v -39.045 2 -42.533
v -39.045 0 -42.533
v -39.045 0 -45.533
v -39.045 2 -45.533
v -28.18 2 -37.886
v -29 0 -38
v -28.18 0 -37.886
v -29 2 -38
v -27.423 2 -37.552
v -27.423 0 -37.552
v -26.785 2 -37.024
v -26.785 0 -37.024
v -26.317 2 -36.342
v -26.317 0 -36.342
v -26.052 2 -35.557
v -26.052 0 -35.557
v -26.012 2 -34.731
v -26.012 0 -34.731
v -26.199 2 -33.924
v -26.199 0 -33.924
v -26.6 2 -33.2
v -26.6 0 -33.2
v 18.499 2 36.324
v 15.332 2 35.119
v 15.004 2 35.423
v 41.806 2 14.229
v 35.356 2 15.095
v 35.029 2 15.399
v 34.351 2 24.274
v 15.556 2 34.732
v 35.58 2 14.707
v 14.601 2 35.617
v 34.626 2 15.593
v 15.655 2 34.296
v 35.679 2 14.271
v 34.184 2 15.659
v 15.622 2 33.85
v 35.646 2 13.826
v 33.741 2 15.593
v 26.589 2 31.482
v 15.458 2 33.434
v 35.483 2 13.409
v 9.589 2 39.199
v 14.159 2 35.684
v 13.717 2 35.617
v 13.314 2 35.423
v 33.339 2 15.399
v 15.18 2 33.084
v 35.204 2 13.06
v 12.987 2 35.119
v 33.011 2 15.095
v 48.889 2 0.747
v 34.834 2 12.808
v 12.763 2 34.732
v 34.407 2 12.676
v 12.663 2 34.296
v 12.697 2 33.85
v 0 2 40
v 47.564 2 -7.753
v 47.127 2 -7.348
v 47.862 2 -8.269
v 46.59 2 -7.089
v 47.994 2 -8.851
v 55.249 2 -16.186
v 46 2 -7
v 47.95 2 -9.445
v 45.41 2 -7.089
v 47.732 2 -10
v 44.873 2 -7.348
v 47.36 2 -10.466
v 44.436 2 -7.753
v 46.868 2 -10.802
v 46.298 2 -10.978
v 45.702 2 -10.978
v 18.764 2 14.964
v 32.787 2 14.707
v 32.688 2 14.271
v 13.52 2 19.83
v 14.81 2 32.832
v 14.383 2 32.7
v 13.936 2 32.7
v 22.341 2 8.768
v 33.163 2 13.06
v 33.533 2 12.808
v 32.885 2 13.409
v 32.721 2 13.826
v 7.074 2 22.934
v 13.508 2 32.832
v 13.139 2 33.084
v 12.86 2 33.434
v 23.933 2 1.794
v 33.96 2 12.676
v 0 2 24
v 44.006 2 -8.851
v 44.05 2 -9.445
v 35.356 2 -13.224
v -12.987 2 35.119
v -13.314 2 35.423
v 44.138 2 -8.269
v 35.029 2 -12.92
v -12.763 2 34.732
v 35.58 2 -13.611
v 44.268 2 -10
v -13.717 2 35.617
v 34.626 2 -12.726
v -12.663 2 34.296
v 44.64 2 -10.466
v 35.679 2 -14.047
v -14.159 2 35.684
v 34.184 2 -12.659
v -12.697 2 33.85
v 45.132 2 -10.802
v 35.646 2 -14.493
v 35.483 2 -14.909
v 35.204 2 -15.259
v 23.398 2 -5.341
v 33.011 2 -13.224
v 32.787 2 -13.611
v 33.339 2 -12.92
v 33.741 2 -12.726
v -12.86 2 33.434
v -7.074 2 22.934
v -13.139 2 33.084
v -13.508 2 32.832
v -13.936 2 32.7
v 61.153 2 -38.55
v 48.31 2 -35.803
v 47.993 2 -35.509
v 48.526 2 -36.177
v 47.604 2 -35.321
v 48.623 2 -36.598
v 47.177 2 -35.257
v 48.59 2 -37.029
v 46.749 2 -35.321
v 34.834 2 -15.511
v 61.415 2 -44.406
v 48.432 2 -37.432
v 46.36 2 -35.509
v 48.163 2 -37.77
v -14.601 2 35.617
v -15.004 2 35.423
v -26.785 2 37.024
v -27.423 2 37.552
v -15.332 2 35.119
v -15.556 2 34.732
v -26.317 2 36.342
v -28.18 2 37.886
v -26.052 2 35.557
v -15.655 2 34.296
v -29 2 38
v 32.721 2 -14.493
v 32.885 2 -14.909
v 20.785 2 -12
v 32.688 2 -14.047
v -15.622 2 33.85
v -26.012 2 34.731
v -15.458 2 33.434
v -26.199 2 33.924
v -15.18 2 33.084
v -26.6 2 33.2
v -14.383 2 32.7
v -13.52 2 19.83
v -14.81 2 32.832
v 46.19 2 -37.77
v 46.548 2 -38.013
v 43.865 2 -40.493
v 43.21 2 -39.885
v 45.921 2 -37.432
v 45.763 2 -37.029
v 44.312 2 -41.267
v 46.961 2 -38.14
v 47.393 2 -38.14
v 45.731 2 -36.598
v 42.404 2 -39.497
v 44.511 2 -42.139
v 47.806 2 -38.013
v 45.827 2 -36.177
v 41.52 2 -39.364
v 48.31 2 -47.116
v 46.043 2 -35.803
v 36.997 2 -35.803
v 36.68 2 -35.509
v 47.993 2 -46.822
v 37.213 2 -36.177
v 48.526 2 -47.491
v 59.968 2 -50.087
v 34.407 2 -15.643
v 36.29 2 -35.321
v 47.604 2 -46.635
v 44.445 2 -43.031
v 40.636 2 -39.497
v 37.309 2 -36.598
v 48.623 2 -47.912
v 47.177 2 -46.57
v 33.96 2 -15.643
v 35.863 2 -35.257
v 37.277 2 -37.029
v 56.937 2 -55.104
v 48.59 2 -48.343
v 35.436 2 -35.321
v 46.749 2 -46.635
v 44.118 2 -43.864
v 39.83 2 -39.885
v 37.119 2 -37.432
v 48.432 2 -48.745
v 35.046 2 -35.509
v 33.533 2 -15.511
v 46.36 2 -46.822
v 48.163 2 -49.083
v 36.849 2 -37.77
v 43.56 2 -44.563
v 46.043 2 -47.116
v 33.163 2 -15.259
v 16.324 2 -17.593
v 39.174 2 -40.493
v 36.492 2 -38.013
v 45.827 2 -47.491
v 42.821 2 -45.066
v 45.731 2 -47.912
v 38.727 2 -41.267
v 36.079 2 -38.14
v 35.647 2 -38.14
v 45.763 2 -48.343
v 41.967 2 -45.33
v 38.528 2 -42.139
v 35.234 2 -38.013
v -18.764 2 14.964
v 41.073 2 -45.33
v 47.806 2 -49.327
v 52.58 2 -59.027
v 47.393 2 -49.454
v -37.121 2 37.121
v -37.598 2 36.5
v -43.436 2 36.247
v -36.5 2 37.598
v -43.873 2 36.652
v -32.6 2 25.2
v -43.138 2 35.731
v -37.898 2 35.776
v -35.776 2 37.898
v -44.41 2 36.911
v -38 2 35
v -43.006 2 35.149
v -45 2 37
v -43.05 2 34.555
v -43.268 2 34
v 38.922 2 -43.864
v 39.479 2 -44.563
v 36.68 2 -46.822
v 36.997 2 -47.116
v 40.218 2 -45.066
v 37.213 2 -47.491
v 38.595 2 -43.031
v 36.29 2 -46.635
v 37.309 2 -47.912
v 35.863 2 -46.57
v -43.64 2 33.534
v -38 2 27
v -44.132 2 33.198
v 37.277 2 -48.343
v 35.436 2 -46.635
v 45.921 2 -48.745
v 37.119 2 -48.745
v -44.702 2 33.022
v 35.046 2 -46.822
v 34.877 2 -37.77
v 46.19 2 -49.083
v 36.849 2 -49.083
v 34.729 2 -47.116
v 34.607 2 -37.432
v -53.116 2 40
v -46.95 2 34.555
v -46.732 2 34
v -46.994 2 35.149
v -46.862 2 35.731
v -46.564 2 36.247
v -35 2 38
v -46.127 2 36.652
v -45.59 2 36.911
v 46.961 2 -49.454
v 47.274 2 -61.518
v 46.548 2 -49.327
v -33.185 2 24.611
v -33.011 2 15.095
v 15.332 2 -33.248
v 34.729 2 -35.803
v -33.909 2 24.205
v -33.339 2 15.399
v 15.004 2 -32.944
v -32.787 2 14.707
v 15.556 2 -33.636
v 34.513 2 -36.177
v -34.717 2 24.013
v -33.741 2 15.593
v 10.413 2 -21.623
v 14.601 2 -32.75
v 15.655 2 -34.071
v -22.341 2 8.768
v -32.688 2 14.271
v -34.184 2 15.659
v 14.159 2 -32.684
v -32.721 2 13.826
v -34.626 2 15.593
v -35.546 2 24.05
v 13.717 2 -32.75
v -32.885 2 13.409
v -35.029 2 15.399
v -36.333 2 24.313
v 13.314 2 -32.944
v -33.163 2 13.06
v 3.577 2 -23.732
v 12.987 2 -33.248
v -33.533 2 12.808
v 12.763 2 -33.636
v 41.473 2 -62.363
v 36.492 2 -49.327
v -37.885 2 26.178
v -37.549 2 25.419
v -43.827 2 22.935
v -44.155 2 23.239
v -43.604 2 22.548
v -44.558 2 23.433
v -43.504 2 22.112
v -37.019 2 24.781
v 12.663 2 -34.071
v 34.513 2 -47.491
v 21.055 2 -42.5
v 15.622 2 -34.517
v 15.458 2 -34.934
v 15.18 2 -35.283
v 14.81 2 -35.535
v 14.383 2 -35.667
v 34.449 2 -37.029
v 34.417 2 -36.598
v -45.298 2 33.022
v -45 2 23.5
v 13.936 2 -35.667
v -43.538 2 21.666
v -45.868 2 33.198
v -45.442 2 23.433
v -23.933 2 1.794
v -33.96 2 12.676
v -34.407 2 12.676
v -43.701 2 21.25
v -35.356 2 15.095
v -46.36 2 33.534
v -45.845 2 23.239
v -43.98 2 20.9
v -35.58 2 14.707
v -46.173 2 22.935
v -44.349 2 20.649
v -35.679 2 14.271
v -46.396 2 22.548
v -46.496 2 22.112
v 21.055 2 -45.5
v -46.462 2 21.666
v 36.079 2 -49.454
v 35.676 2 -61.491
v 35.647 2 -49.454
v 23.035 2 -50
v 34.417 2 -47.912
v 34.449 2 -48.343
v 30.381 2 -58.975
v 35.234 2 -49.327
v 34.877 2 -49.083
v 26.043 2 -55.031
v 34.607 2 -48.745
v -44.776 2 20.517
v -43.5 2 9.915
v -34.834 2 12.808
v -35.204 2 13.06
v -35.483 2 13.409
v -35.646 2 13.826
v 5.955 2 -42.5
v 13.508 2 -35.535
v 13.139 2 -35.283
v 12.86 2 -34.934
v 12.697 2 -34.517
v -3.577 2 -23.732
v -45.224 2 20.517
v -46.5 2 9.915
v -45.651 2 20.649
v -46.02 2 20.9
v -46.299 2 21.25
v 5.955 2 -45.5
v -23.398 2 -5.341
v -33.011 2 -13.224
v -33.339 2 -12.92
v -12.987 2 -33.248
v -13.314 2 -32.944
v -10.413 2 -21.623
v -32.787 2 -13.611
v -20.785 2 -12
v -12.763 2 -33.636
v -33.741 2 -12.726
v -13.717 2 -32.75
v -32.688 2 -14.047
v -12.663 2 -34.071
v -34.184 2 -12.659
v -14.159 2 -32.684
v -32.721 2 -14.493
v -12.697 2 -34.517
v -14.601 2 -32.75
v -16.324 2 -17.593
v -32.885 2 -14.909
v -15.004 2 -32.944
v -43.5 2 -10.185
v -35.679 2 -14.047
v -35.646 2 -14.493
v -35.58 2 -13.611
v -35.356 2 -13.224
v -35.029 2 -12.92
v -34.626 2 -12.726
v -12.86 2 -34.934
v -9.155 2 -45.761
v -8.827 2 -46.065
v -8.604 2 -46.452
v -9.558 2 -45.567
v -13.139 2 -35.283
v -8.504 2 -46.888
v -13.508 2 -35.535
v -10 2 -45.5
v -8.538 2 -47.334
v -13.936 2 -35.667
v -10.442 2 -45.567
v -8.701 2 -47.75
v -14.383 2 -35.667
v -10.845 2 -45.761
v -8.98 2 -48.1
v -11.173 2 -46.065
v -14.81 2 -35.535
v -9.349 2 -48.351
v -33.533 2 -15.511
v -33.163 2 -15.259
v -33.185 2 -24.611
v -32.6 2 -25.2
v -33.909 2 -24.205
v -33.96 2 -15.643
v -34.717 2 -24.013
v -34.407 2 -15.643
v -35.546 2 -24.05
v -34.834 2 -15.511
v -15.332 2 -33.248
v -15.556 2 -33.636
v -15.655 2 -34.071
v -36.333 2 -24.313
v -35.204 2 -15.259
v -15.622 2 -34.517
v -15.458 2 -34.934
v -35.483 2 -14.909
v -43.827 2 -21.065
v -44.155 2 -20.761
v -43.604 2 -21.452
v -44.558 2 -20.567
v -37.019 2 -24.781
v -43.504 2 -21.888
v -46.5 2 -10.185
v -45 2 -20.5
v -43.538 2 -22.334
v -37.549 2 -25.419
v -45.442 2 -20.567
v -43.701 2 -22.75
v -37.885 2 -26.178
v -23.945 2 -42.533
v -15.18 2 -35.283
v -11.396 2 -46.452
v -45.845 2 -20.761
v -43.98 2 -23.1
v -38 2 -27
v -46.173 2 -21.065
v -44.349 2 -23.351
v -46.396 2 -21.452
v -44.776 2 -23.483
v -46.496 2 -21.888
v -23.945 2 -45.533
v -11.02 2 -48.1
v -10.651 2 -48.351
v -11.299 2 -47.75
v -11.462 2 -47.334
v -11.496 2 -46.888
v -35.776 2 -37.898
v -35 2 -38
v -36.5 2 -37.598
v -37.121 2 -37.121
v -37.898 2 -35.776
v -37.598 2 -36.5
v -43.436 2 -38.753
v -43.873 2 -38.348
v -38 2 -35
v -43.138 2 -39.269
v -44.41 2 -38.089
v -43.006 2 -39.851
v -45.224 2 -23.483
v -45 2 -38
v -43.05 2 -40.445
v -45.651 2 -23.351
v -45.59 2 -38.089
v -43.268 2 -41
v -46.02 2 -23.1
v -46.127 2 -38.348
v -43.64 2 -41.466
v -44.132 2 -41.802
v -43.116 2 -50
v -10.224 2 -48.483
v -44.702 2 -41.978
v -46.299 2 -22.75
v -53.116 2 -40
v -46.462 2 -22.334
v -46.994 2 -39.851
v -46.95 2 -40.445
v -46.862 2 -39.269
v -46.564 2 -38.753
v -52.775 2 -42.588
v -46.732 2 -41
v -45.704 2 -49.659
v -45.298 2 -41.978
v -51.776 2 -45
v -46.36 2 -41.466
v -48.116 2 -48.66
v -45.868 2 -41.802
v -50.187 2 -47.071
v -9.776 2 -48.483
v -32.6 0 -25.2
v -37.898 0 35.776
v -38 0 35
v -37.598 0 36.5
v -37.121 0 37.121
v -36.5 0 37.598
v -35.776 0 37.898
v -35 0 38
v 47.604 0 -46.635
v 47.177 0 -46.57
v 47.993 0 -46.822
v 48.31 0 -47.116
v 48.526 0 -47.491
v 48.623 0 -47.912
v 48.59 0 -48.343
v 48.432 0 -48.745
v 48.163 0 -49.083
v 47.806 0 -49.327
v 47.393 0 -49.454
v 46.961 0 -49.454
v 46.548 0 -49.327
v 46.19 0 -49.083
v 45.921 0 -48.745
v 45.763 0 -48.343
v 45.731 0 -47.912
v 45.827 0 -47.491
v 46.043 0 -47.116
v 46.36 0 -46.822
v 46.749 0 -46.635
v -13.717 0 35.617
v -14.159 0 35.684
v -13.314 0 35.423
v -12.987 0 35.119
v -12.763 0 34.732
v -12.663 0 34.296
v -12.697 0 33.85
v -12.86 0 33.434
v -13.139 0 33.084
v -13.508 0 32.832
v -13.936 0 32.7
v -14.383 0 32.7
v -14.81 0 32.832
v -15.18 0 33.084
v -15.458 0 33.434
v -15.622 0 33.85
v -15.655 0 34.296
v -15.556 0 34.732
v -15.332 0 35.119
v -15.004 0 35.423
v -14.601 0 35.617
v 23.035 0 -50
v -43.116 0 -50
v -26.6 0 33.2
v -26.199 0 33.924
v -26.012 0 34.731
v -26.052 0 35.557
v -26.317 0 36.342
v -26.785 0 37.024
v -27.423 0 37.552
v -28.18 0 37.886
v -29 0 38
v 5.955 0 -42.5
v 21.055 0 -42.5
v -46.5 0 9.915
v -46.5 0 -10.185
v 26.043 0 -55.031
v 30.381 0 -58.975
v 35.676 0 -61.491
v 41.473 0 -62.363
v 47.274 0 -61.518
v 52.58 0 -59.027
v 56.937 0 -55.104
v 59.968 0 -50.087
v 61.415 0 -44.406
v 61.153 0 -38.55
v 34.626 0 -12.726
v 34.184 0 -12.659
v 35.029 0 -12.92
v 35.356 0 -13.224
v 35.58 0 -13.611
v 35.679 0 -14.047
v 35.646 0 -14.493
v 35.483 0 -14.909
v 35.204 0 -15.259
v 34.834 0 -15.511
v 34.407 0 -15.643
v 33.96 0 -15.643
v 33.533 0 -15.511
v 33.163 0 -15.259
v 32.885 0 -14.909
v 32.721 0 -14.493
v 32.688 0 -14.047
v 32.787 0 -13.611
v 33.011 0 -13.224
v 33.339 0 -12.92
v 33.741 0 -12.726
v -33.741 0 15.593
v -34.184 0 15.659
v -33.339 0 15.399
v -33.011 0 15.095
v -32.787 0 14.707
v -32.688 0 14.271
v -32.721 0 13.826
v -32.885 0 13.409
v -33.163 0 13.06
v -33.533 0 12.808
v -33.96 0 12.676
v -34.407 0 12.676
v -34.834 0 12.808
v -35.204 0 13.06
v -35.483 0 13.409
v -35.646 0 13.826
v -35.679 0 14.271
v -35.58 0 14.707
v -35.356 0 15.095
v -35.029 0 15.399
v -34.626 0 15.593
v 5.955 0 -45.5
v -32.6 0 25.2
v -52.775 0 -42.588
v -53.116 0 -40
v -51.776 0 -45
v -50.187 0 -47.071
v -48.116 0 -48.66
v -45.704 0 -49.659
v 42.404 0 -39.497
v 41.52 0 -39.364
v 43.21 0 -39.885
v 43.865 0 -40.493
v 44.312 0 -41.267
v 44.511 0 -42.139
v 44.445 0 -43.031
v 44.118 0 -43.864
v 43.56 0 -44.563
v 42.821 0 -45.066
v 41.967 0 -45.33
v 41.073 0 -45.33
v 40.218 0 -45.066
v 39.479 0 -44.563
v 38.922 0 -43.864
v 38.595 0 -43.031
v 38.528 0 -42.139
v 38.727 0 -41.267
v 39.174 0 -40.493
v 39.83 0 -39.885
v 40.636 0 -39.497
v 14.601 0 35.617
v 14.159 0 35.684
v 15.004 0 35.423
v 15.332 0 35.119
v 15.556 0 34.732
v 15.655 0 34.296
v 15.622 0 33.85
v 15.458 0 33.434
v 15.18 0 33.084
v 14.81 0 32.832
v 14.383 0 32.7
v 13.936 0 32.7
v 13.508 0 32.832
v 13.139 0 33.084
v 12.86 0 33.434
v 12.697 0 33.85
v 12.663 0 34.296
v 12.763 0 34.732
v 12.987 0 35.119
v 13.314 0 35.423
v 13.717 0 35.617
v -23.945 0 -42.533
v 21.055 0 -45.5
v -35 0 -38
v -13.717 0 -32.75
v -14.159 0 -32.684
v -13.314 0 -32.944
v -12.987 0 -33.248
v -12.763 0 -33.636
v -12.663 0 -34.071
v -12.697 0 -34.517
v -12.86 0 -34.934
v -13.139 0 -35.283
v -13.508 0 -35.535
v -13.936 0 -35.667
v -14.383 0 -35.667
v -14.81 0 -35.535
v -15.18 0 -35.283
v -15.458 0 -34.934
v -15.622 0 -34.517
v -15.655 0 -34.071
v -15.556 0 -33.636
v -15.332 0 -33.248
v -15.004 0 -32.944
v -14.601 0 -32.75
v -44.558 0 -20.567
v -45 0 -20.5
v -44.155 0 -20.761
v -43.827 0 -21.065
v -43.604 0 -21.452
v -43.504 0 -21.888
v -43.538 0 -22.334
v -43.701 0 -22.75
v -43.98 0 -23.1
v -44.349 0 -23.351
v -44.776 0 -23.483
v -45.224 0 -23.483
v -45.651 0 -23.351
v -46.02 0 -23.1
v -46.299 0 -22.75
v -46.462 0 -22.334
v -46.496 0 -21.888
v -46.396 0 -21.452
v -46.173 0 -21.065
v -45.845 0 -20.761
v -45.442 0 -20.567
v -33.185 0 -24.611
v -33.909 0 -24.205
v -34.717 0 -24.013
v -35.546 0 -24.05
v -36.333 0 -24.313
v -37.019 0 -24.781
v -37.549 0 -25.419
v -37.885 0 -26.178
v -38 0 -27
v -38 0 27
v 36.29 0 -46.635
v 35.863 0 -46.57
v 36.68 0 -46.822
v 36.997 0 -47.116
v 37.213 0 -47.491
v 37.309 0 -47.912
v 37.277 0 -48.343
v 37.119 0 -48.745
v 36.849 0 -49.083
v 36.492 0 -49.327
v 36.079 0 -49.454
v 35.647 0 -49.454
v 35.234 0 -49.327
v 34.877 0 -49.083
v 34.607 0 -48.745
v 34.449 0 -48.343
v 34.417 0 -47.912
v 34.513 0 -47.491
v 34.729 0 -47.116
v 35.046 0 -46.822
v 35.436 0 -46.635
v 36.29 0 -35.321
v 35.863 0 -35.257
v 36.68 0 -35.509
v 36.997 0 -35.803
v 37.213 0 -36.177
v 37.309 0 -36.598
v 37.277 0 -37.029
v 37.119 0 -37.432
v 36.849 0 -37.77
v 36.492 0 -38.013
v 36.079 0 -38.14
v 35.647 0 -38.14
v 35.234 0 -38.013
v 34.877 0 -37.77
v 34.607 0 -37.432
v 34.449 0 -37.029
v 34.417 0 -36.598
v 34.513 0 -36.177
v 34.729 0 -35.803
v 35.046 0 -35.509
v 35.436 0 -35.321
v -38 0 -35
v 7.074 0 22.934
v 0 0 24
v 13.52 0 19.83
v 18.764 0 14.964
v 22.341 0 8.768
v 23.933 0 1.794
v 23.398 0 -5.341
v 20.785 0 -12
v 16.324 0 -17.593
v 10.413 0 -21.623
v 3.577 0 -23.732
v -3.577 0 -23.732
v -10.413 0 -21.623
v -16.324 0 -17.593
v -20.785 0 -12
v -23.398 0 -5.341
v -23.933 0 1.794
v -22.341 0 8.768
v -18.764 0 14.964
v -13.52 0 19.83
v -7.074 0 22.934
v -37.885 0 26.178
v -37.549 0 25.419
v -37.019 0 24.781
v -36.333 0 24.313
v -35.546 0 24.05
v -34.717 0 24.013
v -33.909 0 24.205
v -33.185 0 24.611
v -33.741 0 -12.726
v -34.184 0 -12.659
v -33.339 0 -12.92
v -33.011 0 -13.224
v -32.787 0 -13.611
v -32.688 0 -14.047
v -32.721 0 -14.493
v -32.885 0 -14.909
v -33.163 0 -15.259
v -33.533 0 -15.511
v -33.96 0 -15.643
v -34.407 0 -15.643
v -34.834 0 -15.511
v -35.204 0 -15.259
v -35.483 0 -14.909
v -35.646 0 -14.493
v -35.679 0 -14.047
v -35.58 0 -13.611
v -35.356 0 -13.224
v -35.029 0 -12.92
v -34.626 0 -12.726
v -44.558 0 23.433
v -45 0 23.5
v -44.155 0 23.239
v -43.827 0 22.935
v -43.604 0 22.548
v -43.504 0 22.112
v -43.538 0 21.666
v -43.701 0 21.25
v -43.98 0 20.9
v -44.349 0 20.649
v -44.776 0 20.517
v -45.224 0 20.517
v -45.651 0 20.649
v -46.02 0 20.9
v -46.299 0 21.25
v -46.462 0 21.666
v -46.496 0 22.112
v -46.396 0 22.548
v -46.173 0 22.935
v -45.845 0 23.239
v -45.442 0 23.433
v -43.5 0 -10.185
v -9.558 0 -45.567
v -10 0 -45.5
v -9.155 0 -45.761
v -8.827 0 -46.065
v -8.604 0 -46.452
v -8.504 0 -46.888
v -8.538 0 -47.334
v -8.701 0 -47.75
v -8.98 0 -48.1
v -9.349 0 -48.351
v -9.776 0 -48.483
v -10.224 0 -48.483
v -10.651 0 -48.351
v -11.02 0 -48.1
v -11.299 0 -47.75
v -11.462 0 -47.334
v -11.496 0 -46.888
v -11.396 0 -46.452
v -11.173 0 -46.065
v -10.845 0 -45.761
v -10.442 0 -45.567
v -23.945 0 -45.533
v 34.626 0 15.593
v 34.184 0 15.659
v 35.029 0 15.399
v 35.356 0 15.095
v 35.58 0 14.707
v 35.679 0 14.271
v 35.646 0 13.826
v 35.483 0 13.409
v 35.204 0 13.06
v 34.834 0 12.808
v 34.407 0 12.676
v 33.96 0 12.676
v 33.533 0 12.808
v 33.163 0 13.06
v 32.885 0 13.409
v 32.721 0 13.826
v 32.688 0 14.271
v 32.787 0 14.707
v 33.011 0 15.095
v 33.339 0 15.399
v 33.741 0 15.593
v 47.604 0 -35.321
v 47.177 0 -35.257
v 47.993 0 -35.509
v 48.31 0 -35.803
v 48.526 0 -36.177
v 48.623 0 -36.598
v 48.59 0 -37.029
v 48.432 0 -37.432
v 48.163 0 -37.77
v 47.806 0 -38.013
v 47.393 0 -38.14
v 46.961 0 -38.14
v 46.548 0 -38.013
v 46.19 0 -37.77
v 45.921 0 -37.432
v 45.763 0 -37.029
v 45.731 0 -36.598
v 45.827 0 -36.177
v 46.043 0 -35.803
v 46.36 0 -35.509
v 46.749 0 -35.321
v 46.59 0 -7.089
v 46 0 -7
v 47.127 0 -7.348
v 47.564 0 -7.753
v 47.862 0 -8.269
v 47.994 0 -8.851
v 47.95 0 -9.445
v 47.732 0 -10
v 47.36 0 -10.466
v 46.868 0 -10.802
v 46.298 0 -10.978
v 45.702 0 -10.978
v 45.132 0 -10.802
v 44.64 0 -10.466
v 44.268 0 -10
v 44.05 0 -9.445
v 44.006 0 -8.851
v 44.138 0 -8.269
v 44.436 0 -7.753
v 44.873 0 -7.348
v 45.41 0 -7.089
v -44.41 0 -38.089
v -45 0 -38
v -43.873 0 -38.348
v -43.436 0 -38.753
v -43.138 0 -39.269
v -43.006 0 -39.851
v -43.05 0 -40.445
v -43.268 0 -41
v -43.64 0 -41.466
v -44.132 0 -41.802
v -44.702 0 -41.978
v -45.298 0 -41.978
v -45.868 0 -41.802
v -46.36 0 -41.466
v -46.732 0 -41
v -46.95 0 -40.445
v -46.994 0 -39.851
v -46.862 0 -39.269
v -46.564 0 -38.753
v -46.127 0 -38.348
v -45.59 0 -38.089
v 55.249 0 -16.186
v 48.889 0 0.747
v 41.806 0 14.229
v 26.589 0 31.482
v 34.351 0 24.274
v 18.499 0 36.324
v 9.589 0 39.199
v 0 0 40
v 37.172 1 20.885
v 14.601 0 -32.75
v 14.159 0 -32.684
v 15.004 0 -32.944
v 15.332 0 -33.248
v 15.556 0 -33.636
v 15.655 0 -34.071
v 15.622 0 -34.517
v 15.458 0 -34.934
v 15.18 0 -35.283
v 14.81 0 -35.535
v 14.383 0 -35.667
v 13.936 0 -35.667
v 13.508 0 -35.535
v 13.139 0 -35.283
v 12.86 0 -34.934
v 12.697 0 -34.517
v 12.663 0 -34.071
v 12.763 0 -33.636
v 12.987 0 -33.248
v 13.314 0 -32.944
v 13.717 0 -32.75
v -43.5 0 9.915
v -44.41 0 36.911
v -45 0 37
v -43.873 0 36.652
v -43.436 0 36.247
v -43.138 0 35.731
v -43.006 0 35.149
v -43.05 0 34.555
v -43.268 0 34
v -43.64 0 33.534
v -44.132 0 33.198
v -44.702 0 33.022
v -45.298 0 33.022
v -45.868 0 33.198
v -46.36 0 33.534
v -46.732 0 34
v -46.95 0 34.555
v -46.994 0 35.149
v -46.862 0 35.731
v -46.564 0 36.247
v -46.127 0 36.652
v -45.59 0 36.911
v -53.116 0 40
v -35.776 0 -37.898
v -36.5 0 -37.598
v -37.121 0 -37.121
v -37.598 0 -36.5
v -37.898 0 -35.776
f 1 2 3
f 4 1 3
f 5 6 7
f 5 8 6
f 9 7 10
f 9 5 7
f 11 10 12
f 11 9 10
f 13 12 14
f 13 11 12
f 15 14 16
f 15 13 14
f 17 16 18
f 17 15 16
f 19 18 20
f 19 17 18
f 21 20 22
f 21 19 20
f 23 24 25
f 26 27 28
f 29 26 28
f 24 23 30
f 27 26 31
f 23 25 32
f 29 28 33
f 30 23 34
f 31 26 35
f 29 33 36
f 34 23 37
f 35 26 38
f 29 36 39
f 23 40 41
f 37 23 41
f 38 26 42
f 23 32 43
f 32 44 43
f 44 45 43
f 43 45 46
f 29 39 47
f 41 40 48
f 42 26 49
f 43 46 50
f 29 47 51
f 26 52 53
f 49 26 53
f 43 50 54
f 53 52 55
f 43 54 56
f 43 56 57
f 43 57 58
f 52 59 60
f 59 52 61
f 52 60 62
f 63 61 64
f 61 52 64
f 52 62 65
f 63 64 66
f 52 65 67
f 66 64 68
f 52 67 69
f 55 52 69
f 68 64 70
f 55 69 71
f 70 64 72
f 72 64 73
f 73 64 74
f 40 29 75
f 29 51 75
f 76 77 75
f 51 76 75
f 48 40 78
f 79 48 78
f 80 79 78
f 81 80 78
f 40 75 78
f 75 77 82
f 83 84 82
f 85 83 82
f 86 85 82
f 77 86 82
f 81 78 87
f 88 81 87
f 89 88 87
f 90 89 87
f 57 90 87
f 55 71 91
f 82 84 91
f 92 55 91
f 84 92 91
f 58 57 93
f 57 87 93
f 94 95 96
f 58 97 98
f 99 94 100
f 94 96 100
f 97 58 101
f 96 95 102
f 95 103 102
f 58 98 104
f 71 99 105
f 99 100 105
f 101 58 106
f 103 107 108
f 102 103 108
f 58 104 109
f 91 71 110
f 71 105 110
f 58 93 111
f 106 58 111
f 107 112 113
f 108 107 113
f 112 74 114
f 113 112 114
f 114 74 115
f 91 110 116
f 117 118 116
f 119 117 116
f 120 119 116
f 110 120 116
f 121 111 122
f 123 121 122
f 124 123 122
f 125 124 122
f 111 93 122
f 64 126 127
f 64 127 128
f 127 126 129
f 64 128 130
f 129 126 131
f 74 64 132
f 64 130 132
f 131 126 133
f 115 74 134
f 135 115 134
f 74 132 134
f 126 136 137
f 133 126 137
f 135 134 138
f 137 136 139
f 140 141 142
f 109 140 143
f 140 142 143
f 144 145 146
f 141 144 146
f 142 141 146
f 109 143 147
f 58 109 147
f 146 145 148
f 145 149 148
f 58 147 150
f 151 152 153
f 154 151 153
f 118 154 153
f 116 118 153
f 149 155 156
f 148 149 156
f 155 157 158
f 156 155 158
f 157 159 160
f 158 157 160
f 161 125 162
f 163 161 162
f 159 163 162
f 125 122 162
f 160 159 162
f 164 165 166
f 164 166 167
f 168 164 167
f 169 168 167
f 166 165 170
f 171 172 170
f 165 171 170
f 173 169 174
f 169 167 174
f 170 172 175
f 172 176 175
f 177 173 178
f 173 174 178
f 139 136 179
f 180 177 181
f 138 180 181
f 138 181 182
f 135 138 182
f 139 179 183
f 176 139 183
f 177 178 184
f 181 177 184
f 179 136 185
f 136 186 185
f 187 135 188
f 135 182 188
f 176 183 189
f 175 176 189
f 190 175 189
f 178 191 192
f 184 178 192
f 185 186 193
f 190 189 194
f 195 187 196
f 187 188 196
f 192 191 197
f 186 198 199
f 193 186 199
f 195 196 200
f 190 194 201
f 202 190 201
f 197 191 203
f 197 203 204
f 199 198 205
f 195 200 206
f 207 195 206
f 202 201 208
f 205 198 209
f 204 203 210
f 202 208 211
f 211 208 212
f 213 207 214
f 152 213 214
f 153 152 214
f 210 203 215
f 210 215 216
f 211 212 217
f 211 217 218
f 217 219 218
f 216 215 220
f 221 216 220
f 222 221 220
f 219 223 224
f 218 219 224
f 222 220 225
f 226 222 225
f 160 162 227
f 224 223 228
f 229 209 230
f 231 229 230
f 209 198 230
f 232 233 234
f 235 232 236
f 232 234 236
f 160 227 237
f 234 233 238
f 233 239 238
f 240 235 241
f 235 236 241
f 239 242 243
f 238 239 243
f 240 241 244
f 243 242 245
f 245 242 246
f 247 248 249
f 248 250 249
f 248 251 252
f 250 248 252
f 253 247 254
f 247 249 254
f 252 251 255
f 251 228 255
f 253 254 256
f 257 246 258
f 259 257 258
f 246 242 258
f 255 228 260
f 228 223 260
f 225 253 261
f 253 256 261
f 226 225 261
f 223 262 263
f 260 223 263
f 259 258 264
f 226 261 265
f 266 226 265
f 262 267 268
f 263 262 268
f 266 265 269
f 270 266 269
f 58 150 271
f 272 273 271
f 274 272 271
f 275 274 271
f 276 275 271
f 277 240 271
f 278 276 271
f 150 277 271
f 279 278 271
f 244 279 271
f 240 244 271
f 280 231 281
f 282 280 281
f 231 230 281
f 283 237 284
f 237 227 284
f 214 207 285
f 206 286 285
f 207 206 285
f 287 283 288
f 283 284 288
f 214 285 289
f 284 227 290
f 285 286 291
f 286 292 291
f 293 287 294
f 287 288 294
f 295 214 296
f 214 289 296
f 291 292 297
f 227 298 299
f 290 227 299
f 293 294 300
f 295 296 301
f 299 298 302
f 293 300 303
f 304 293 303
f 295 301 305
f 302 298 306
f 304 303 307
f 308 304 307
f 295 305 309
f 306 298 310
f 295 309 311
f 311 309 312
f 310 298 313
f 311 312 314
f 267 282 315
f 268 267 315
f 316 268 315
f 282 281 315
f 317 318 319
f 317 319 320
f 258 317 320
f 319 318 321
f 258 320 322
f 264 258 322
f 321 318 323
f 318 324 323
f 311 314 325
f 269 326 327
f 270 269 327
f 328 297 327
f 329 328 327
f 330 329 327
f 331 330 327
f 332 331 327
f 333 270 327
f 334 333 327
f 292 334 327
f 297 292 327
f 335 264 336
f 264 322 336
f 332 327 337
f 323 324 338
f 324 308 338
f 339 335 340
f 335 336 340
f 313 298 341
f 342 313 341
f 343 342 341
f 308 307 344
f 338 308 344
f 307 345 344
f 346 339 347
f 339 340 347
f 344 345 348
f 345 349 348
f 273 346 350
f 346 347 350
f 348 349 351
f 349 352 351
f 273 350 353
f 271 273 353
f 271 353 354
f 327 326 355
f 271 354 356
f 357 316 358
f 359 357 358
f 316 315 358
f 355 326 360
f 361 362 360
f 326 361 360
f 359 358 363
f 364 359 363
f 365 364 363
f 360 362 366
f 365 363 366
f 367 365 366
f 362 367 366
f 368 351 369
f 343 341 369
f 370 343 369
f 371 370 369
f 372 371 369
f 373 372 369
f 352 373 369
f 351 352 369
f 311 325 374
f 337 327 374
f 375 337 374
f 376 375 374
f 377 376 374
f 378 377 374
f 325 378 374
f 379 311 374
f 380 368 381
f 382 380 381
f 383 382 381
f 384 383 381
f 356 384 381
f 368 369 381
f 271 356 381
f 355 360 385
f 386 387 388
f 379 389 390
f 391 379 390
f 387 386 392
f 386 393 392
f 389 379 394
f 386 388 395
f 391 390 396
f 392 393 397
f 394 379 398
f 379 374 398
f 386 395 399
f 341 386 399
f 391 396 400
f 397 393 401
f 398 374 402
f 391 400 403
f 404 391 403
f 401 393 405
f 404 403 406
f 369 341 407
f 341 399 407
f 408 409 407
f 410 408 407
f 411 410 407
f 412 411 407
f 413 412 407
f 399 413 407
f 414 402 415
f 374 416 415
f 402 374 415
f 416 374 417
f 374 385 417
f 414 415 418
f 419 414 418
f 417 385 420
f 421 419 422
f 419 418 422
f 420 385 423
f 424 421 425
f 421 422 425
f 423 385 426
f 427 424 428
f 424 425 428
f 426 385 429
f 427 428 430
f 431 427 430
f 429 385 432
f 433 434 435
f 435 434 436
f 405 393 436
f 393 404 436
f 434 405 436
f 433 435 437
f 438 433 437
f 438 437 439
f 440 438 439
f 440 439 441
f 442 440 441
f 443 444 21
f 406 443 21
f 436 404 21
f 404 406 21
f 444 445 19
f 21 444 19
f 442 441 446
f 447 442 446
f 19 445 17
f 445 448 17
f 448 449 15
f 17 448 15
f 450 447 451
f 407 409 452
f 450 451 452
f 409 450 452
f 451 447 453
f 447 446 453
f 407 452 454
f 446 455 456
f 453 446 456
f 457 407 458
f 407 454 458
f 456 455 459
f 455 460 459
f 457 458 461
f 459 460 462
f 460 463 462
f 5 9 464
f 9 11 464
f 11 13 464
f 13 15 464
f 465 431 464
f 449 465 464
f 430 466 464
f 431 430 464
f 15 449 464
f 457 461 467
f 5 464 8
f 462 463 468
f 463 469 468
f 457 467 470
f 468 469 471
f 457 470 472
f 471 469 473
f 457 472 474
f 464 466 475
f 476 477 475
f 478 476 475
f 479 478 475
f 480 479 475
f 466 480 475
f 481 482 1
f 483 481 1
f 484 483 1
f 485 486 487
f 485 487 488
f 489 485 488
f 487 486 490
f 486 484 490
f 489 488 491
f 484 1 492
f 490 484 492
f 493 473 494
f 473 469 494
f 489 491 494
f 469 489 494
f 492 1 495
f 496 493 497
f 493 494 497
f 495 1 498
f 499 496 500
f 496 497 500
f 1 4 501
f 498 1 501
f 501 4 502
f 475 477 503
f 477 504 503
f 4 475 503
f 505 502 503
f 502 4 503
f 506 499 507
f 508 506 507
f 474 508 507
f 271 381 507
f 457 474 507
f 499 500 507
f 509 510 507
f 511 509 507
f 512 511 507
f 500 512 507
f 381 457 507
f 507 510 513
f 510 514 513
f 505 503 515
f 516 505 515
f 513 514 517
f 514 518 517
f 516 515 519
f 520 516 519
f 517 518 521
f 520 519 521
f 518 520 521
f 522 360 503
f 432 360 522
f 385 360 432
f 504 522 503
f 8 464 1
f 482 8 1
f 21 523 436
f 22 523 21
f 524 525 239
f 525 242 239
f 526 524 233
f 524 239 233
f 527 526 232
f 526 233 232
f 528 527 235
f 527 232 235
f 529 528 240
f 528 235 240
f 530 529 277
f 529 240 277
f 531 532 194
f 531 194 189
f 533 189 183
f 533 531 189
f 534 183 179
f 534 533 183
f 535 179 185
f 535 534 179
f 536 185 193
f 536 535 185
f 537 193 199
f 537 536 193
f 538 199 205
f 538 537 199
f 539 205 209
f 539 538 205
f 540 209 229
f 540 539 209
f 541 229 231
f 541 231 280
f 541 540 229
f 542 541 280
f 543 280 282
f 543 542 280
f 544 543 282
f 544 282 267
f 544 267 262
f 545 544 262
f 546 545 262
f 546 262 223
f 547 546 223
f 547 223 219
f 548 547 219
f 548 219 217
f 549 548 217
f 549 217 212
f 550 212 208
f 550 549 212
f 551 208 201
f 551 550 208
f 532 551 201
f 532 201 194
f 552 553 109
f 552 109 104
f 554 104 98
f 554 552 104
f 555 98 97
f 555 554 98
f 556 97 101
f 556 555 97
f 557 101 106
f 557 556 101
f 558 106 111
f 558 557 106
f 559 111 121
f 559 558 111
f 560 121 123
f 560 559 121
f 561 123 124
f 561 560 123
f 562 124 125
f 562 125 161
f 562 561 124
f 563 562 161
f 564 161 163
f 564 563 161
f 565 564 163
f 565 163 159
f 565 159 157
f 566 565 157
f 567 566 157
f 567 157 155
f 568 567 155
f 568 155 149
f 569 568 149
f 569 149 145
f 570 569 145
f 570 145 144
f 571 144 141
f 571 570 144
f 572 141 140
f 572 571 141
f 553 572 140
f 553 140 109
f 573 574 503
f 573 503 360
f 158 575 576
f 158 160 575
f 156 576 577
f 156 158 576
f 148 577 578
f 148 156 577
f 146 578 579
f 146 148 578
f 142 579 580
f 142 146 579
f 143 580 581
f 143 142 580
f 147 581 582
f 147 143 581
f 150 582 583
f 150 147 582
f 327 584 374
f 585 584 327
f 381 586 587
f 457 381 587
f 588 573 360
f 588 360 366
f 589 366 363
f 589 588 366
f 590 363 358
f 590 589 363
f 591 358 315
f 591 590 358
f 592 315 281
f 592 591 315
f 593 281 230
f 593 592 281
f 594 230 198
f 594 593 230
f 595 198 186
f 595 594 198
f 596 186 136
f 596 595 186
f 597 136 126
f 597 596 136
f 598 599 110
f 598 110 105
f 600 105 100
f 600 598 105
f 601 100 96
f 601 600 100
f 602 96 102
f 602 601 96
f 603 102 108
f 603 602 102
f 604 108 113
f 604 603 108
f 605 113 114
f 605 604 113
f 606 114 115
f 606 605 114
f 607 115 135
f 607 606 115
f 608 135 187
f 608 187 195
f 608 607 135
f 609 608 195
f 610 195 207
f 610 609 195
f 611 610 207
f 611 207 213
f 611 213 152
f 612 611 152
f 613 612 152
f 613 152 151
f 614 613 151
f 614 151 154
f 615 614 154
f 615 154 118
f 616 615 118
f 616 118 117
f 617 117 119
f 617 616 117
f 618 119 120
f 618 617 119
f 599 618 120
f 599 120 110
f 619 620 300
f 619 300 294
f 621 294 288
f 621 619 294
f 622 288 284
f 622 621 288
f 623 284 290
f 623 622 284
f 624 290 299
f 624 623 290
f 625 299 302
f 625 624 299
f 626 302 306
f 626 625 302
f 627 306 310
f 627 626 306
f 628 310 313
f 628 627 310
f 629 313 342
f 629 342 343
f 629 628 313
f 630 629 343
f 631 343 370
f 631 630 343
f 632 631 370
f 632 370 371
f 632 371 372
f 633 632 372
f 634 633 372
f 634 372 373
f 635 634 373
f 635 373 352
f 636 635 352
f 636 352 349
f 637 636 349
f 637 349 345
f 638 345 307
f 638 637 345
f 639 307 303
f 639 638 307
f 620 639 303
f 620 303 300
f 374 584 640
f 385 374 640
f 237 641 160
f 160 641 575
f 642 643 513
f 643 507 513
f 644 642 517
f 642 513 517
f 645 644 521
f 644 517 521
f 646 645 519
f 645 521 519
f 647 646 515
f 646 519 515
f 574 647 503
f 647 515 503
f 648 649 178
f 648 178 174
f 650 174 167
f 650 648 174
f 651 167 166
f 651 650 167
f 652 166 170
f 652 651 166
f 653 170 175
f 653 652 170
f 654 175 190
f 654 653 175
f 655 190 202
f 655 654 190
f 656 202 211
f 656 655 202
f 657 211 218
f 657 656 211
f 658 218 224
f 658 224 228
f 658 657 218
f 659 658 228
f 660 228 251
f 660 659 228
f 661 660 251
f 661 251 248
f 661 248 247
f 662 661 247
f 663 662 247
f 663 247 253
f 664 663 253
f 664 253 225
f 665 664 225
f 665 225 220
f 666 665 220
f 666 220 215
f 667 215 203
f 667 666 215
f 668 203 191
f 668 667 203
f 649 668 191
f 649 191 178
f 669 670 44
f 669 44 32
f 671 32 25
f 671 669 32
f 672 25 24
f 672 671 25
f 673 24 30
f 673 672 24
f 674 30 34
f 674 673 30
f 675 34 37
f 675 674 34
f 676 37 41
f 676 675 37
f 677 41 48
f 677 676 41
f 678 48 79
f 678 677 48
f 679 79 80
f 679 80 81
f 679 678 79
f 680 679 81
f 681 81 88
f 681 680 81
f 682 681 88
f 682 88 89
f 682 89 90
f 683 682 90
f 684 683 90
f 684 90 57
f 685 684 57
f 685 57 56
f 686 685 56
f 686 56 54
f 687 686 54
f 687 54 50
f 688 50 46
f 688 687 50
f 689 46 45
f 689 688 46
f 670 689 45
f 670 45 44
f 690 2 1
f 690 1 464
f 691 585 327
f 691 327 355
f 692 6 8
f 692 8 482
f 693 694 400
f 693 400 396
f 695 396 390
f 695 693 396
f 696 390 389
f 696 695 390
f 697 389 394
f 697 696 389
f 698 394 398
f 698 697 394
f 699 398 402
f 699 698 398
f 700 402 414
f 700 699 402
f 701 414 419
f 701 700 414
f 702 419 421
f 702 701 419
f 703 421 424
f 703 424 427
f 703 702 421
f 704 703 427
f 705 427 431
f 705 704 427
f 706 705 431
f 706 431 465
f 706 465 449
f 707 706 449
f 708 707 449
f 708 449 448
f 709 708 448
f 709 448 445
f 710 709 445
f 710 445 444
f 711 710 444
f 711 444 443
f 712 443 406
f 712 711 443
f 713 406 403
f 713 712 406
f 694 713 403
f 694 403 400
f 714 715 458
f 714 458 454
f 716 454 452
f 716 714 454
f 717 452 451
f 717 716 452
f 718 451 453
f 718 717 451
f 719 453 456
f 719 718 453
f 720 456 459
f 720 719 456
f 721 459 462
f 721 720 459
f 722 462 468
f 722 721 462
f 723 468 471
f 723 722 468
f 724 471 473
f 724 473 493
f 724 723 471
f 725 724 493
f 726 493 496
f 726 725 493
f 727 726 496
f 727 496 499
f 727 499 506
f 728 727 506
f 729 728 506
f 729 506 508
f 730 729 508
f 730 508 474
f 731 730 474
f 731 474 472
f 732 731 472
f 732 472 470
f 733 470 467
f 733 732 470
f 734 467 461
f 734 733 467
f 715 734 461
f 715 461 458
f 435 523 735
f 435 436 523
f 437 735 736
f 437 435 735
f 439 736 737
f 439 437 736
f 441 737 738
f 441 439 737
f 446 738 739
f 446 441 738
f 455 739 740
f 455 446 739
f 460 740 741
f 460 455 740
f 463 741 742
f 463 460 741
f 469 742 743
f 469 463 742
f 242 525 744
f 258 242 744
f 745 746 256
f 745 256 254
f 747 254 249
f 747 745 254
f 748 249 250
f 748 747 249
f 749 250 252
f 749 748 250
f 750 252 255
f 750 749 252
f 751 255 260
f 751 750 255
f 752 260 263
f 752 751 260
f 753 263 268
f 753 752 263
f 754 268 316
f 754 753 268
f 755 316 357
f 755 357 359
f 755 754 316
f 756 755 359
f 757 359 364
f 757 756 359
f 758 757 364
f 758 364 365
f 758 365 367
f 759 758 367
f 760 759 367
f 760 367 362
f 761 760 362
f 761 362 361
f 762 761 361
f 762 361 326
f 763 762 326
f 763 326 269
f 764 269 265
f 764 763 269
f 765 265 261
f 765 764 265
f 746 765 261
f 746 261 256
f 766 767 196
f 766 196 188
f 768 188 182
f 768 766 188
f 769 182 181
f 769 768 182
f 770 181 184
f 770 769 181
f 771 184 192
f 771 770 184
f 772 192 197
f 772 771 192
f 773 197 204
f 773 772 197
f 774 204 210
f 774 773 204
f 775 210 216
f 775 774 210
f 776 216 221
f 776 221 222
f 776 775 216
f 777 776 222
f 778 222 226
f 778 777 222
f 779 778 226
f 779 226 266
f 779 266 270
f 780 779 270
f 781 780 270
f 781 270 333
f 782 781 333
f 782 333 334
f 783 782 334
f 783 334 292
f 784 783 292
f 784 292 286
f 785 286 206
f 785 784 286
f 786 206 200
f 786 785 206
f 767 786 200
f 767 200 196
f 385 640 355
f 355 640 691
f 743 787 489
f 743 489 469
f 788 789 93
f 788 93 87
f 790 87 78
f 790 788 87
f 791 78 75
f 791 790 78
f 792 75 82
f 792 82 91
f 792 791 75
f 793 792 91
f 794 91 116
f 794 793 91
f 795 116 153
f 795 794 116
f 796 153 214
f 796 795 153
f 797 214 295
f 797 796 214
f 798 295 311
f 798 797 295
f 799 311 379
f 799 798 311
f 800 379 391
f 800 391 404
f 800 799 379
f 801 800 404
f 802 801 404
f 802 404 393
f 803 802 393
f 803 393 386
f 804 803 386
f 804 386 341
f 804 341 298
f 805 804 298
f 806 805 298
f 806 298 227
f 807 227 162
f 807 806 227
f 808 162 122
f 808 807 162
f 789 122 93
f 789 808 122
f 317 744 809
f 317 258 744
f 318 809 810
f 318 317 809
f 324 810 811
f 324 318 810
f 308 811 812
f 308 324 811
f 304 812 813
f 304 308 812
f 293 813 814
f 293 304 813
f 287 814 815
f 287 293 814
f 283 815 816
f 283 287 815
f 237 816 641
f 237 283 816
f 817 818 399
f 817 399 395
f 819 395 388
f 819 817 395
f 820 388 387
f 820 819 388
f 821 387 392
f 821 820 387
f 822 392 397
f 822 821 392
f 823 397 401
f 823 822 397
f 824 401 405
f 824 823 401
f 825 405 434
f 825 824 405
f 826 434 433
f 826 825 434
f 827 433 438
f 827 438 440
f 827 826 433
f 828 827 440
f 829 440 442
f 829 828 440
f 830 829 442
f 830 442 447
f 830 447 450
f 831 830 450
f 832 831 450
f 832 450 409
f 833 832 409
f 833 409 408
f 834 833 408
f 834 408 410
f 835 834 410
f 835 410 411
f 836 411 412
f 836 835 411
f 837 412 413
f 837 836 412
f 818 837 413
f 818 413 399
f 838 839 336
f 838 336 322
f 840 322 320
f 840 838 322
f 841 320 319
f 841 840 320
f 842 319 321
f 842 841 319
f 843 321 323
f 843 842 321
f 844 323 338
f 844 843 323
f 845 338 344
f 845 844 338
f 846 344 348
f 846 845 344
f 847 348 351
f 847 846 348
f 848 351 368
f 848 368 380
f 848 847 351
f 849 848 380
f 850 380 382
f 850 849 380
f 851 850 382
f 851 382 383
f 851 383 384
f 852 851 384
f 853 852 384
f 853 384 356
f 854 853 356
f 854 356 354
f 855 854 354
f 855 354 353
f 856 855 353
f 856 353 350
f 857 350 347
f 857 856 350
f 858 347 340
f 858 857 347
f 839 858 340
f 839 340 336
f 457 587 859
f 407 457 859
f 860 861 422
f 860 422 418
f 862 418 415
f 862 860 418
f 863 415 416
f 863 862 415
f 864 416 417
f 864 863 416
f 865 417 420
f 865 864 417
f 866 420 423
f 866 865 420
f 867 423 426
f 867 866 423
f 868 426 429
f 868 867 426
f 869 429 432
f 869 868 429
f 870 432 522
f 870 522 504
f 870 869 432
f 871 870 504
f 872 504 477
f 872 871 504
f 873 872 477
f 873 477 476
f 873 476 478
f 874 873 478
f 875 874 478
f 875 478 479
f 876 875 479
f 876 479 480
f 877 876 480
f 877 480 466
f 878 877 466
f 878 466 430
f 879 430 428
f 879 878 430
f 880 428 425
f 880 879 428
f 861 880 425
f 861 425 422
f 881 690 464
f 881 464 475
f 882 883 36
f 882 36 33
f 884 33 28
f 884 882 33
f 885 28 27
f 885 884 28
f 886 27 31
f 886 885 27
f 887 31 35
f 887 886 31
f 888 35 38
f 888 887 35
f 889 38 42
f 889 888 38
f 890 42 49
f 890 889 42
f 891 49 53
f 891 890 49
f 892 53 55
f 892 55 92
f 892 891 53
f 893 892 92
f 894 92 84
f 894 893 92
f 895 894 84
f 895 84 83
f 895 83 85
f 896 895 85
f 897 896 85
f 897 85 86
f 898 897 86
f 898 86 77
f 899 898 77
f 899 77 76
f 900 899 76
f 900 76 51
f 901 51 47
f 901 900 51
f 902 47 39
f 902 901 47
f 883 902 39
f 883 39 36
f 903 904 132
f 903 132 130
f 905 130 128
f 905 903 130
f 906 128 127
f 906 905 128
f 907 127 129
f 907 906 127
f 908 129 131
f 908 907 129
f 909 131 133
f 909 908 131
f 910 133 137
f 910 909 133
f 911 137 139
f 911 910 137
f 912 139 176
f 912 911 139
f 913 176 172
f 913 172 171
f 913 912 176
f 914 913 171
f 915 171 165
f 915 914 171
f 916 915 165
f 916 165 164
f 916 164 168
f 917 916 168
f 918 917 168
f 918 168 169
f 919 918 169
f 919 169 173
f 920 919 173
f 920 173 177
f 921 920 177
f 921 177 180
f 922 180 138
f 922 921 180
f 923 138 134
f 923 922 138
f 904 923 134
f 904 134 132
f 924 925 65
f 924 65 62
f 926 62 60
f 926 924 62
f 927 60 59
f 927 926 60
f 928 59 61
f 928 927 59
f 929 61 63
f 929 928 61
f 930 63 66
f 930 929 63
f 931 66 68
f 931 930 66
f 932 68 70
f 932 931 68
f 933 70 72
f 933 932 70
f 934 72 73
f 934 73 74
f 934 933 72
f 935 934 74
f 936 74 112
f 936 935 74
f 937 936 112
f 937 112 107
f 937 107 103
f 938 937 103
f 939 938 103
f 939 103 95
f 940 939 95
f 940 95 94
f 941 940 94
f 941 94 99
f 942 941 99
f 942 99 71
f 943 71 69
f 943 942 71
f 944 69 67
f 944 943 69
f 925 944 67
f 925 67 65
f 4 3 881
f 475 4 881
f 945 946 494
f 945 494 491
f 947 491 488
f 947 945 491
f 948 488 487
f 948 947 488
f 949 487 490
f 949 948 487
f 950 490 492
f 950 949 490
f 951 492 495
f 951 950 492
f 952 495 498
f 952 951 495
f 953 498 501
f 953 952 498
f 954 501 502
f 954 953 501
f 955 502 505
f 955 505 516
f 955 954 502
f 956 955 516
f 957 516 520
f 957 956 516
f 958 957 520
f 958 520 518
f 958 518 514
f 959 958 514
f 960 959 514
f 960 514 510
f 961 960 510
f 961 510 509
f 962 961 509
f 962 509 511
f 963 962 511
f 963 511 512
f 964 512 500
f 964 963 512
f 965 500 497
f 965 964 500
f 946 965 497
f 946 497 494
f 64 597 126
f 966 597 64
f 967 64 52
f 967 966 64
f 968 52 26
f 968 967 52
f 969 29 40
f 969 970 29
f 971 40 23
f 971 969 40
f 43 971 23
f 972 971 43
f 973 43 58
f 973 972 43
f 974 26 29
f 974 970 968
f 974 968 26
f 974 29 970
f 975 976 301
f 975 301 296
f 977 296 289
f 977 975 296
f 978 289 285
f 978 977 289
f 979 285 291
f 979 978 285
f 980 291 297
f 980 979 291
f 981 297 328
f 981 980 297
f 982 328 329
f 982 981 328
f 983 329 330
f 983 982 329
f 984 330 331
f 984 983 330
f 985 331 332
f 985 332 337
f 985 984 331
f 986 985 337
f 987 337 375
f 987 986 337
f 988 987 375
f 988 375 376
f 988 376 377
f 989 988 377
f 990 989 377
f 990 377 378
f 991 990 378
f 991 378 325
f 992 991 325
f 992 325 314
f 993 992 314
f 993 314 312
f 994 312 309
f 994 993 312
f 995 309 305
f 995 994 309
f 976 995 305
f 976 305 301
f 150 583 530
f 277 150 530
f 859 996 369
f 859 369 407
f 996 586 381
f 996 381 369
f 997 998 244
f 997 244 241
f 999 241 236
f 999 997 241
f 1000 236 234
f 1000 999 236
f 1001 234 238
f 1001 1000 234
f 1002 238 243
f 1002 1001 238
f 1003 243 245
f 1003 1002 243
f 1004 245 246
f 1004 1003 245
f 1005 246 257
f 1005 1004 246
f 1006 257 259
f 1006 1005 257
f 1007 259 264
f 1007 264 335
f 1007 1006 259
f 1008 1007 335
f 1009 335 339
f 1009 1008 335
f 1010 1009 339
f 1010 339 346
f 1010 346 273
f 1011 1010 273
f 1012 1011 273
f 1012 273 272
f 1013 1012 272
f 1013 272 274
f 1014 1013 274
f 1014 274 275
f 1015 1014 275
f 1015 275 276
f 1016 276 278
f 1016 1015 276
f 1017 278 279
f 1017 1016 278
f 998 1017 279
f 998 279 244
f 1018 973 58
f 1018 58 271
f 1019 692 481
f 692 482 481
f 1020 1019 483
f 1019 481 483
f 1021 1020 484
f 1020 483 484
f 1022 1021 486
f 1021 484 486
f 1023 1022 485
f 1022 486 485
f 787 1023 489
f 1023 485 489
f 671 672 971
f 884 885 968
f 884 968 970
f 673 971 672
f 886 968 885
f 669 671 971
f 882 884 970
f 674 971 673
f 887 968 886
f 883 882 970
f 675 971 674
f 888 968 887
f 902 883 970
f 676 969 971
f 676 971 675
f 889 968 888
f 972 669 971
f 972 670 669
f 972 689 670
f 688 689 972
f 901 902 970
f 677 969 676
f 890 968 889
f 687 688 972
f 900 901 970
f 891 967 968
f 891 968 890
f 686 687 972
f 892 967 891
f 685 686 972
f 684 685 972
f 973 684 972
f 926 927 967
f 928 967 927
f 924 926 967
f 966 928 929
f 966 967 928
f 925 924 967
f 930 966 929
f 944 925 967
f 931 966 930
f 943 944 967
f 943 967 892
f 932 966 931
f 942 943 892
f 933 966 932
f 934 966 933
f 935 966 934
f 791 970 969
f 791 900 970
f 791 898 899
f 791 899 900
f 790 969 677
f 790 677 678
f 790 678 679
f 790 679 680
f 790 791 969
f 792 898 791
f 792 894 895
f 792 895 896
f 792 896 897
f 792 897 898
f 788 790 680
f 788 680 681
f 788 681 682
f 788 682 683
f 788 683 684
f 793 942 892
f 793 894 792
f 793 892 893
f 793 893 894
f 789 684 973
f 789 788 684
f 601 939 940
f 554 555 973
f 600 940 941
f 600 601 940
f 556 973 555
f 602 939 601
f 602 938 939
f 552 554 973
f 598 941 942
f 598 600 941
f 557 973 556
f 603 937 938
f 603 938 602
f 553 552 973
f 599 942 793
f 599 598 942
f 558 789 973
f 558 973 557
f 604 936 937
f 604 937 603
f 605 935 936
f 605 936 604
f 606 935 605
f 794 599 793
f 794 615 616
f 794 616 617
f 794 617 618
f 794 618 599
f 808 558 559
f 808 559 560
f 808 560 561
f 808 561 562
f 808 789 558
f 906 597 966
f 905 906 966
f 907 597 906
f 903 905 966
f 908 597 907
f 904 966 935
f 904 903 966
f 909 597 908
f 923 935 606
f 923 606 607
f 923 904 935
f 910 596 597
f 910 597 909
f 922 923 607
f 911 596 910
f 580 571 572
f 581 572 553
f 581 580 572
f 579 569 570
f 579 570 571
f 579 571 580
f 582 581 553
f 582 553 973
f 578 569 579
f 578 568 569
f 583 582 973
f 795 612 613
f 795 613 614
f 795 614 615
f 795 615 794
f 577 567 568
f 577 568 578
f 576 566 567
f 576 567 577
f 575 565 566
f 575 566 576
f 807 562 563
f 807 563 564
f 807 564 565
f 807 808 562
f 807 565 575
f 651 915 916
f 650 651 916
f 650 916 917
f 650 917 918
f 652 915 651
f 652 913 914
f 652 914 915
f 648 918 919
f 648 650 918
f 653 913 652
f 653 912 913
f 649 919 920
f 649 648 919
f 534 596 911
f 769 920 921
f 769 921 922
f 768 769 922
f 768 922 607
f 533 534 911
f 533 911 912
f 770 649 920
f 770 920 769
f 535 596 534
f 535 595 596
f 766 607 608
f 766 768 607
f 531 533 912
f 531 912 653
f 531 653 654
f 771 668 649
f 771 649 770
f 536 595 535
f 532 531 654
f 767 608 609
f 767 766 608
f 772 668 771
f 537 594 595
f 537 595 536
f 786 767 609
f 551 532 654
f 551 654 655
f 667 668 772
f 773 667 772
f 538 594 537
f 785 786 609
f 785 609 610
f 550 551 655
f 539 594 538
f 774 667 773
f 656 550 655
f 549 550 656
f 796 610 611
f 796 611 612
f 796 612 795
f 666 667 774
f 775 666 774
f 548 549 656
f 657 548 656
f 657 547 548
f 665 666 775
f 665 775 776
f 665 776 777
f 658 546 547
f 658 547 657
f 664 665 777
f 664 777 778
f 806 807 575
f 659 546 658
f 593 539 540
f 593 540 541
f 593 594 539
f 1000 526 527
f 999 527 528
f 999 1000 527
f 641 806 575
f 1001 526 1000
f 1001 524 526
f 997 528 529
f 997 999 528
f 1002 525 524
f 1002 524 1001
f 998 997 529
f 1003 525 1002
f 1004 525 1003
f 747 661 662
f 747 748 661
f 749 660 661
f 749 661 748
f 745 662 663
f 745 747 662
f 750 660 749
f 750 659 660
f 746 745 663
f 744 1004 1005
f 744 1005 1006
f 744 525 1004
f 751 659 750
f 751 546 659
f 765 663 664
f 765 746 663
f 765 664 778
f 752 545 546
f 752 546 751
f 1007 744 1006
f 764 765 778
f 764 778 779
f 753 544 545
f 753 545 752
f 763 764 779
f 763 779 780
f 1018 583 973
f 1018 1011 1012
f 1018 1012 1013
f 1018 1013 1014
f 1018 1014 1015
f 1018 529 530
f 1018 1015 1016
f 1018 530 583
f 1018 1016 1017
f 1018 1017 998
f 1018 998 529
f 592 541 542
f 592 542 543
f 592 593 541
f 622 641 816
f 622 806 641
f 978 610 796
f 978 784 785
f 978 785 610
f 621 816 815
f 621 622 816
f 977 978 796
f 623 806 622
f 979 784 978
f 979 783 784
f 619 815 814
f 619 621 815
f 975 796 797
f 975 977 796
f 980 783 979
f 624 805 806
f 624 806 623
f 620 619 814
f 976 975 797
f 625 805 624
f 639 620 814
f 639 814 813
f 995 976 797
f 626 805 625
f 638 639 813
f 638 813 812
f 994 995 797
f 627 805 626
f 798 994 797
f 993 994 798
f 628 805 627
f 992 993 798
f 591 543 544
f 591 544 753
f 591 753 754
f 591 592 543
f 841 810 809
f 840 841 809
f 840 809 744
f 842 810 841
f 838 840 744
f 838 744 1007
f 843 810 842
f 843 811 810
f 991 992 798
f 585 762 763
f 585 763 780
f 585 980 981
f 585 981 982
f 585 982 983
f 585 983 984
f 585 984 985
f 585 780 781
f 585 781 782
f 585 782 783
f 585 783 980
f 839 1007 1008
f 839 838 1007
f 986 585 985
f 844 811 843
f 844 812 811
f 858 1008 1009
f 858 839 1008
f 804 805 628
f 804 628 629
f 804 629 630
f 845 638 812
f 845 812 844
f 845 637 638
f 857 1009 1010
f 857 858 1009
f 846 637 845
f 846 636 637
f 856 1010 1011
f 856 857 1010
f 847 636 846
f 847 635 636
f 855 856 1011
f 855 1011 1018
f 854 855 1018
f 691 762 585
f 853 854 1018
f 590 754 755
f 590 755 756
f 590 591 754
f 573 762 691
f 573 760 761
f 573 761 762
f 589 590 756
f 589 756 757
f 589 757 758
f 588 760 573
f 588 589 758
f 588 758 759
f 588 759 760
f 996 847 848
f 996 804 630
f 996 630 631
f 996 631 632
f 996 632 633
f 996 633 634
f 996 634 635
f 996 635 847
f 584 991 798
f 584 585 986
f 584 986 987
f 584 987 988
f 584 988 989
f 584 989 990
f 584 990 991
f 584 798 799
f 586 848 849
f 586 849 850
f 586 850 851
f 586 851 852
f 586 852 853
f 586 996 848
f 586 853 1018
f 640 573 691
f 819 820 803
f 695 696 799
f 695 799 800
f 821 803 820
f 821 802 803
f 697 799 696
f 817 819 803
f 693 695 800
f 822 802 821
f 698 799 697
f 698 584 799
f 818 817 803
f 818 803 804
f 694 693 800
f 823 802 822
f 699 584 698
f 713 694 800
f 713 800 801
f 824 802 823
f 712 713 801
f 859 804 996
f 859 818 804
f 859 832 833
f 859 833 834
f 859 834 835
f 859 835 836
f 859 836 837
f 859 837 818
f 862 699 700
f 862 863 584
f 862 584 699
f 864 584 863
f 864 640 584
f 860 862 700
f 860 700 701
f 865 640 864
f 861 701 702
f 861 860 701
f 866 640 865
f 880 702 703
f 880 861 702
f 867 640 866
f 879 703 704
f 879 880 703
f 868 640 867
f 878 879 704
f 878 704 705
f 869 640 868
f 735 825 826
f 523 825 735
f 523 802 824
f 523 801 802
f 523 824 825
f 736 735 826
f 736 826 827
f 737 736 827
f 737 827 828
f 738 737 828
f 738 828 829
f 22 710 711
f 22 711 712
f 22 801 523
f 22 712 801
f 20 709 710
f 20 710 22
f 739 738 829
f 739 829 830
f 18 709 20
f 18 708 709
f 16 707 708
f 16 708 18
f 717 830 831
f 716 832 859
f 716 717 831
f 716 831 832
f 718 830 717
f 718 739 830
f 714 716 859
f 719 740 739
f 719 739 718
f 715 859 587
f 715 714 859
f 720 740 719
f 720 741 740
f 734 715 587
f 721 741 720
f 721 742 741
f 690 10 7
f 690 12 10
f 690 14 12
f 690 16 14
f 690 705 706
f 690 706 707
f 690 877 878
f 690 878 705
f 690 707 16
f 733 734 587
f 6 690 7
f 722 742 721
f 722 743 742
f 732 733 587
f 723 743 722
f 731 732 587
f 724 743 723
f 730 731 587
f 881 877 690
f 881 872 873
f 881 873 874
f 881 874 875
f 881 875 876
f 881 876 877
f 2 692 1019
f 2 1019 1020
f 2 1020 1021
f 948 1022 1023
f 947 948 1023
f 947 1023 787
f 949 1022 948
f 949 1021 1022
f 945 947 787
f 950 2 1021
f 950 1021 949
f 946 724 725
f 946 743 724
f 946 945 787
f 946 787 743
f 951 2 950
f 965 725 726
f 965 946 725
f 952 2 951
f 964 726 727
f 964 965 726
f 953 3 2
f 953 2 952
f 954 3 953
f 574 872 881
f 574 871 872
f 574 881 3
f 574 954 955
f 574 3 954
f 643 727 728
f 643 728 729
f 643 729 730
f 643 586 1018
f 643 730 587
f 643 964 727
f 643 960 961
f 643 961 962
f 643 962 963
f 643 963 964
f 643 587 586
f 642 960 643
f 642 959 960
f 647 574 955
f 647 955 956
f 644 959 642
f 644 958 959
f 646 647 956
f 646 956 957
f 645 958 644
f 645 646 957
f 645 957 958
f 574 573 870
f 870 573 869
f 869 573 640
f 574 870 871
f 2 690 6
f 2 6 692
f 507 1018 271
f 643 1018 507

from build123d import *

# Parameters (mm, degrees)
SKETCH_1_R      = 24
SKETCH_1_R_2    = 3
SKETCH_1_R_3    = 2
SKETCH_1_R_4    = 1.45
SKETCH_1_R_5    = 1.5
SKETCH_1_W      = 15.1
SKETCH_1_H      = 3
SKETCH_1_W_2    = 3
SKETCH_1_H_2    = 20.1
EXTRUDE_1_DEPTH = 2
FILLET_1_R      = 10
FILLET_2_R      = 3


with BuildPart() as part:
    # 草图1 → 凸台-拉伸1 (new body)
    with BuildSketch(Plane(origin=(0, 0, 0), x_dir=(1, 0, 0), z_dir=(0, 1, 0))):
        with BuildLine():
            Line((0, -40), (-53.115531196, -40))
            Line((-53.115531196, -40), (-53.115531196, 50))
            Line((-53.115531196, 50), (23.035101229, 50))
            ThreePointArc((23.035101229, 50), (47.273662895, 61.517967257), (61.152805225, 38.549709823))
            add(Edge.make_bspline(
                [(61.152805225, 38.549709823), (43.767754296, -41.044262003), (0, -40)],
                knots=[0, 0, 0, 0.762442078, 0.762442078, 0.762442078], degree=2))
        make_face()
        with Locations(Location((0, 0, 0), (0, 0, 270))):
            Circle(SKETCH_1_R, mode=Mode.SUBTRACT)
        with Locations(Location((41.5198, 42.363514464, 0), (0, 0, 270))):
            Circle(SKETCH_1_R_2, mode=Mode.SUBTRACT)
        with Locations(Location((46, 9, 0), (0, 0, 270))):
            Circle(SKETCH_1_R_3, mode=Mode.SUBTRACT)
        with Locations(Location((-45, 40, 0), (0, 0, 270))):
            Circle(SKETCH_1_R_3, mode=Mode.SUBTRACT)
        with Locations(Location((-45, -35, 0), (0, 0, 270))):
            Circle(SKETCH_1_R_3, mode=Mode.SUBTRACT)
        with Locations(Location((35.862945751, 48.020368713, 0), (0, 0, 270))):
            Circle(SKETCH_1_R_4, mode=Mode.SUBTRACT)
        with Locations(Location((47.176654249, 48.020368713, 0), (0, 0, 270))):
            Circle(SKETCH_1_R_4, mode=Mode.SUBTRACT)
        with Locations(Location((47.176654249, 36.706660215, 0), (0, 0, 270))):
            Circle(SKETCH_1_R_4, mode=Mode.SUBTRACT)
        with Locations(Location((35.862945751, 36.706660215, 0), (0, 0, 270))):
            Circle(SKETCH_1_R_4, mode=Mode.SUBTRACT)
        with Locations(Location((-45, 22, 0), (0, 0, 270))):
            Circle(SKETCH_1_R_5, mode=Mode.SUBTRACT)
        with Locations(Location((-45, -22, 0), (0, 0, 270))):
            Circle(SKETCH_1_R_5, mode=Mode.SUBTRACT)
        with Locations(Location((34.183542703, 14.159286998, 0), (0, 0, 270))):
            Circle(SKETCH_1_R_5, mode=Mode.SUBTRACT)
        with Locations(Location((34.183542703, -14.159286998, 0), (0, 0, 270))):
            Circle(SKETCH_1_R_5, mode=Mode.SUBTRACT)
        with Locations(Location((14.159286998, -34.183542703, 0), (0, 0, 270))):
            Circle(SKETCH_1_R_5, mode=Mode.SUBTRACT)
        with Locations(Location((-14.159286998, -34.183542703, 0), (0, 0, 270))):
            Circle(SKETCH_1_R_5, mode=Mode.SUBTRACT)
        with Locations(Location((-34.183542703, -14.159286998, 0), (0, 0, 270))):
            Circle(SKETCH_1_R_5, mode=Mode.SUBTRACT)
        with Locations(Location((-34.183542703, 14.159286998, 0), (0, 0, 270))):
            Circle(SKETCH_1_R_5, mode=Mode.SUBTRACT)
        with Locations(Location((-14.159286998, 34.183542703, 0), (0, 0, 270))):
            Circle(SKETCH_1_R_5, mode=Mode.SUBTRACT)
        with Locations(Location((14.159286998, 34.183542703, 0), (0, 0, 270))):
            Circle(SKETCH_1_R_5, mode=Mode.SUBTRACT)
        with Locations(Location((-10, 47, 0), (0, 0, 270))):
            Circle(SKETCH_1_R_5, mode=Mode.SUBTRACT)
        with Locations((-31.49510891, 44.033375725)):
            Rectangle(SKETCH_1_W, SKETCH_1_H, mode=Mode.SUBTRACT)
        with Locations((13.50489109, 44)):
            Rectangle(SKETCH_1_W, SKETCH_1_H, mode=Mode.SUBTRACT)
        with Locations((-45, 0.135026031)):
            Rectangle(SKETCH_1_W_2, SKETCH_1_H_2, mode=Mode.SUBTRACT)
        Polygon((-38, 38), (-38, 18), (-23, 38), align=None, mode=Mode.SUBTRACT)
        Polygon((-38, -38), (-38, -18), (-23, -38), align=None, mode=Mode.SUBTRACT)
    extrude(amount=EXTRUDE_1_DEPTH)

    # 圆角1
    fillet_1_edges = [part.edges().sort_by_distance(p)[0] for p in [
        (-53.115531196, 1, -50),
    ]]
    fillet(fillet_1_edges, radius=FILLET_1_R)

    # 圆角2
    fillet_2_edges = [part.edges().sort_by_distance(p)[0] for p in [
        (-23, 1, -38),
        (-38, 1, -38),
        (-38, 1, -18),
        (-38, 1, 38),
        (-23, 1, 38),
        (-38, 1, 18),
    ]]
    fillet(fillet_2_edges, radius=FILLET_2_R)


solid = part.part
